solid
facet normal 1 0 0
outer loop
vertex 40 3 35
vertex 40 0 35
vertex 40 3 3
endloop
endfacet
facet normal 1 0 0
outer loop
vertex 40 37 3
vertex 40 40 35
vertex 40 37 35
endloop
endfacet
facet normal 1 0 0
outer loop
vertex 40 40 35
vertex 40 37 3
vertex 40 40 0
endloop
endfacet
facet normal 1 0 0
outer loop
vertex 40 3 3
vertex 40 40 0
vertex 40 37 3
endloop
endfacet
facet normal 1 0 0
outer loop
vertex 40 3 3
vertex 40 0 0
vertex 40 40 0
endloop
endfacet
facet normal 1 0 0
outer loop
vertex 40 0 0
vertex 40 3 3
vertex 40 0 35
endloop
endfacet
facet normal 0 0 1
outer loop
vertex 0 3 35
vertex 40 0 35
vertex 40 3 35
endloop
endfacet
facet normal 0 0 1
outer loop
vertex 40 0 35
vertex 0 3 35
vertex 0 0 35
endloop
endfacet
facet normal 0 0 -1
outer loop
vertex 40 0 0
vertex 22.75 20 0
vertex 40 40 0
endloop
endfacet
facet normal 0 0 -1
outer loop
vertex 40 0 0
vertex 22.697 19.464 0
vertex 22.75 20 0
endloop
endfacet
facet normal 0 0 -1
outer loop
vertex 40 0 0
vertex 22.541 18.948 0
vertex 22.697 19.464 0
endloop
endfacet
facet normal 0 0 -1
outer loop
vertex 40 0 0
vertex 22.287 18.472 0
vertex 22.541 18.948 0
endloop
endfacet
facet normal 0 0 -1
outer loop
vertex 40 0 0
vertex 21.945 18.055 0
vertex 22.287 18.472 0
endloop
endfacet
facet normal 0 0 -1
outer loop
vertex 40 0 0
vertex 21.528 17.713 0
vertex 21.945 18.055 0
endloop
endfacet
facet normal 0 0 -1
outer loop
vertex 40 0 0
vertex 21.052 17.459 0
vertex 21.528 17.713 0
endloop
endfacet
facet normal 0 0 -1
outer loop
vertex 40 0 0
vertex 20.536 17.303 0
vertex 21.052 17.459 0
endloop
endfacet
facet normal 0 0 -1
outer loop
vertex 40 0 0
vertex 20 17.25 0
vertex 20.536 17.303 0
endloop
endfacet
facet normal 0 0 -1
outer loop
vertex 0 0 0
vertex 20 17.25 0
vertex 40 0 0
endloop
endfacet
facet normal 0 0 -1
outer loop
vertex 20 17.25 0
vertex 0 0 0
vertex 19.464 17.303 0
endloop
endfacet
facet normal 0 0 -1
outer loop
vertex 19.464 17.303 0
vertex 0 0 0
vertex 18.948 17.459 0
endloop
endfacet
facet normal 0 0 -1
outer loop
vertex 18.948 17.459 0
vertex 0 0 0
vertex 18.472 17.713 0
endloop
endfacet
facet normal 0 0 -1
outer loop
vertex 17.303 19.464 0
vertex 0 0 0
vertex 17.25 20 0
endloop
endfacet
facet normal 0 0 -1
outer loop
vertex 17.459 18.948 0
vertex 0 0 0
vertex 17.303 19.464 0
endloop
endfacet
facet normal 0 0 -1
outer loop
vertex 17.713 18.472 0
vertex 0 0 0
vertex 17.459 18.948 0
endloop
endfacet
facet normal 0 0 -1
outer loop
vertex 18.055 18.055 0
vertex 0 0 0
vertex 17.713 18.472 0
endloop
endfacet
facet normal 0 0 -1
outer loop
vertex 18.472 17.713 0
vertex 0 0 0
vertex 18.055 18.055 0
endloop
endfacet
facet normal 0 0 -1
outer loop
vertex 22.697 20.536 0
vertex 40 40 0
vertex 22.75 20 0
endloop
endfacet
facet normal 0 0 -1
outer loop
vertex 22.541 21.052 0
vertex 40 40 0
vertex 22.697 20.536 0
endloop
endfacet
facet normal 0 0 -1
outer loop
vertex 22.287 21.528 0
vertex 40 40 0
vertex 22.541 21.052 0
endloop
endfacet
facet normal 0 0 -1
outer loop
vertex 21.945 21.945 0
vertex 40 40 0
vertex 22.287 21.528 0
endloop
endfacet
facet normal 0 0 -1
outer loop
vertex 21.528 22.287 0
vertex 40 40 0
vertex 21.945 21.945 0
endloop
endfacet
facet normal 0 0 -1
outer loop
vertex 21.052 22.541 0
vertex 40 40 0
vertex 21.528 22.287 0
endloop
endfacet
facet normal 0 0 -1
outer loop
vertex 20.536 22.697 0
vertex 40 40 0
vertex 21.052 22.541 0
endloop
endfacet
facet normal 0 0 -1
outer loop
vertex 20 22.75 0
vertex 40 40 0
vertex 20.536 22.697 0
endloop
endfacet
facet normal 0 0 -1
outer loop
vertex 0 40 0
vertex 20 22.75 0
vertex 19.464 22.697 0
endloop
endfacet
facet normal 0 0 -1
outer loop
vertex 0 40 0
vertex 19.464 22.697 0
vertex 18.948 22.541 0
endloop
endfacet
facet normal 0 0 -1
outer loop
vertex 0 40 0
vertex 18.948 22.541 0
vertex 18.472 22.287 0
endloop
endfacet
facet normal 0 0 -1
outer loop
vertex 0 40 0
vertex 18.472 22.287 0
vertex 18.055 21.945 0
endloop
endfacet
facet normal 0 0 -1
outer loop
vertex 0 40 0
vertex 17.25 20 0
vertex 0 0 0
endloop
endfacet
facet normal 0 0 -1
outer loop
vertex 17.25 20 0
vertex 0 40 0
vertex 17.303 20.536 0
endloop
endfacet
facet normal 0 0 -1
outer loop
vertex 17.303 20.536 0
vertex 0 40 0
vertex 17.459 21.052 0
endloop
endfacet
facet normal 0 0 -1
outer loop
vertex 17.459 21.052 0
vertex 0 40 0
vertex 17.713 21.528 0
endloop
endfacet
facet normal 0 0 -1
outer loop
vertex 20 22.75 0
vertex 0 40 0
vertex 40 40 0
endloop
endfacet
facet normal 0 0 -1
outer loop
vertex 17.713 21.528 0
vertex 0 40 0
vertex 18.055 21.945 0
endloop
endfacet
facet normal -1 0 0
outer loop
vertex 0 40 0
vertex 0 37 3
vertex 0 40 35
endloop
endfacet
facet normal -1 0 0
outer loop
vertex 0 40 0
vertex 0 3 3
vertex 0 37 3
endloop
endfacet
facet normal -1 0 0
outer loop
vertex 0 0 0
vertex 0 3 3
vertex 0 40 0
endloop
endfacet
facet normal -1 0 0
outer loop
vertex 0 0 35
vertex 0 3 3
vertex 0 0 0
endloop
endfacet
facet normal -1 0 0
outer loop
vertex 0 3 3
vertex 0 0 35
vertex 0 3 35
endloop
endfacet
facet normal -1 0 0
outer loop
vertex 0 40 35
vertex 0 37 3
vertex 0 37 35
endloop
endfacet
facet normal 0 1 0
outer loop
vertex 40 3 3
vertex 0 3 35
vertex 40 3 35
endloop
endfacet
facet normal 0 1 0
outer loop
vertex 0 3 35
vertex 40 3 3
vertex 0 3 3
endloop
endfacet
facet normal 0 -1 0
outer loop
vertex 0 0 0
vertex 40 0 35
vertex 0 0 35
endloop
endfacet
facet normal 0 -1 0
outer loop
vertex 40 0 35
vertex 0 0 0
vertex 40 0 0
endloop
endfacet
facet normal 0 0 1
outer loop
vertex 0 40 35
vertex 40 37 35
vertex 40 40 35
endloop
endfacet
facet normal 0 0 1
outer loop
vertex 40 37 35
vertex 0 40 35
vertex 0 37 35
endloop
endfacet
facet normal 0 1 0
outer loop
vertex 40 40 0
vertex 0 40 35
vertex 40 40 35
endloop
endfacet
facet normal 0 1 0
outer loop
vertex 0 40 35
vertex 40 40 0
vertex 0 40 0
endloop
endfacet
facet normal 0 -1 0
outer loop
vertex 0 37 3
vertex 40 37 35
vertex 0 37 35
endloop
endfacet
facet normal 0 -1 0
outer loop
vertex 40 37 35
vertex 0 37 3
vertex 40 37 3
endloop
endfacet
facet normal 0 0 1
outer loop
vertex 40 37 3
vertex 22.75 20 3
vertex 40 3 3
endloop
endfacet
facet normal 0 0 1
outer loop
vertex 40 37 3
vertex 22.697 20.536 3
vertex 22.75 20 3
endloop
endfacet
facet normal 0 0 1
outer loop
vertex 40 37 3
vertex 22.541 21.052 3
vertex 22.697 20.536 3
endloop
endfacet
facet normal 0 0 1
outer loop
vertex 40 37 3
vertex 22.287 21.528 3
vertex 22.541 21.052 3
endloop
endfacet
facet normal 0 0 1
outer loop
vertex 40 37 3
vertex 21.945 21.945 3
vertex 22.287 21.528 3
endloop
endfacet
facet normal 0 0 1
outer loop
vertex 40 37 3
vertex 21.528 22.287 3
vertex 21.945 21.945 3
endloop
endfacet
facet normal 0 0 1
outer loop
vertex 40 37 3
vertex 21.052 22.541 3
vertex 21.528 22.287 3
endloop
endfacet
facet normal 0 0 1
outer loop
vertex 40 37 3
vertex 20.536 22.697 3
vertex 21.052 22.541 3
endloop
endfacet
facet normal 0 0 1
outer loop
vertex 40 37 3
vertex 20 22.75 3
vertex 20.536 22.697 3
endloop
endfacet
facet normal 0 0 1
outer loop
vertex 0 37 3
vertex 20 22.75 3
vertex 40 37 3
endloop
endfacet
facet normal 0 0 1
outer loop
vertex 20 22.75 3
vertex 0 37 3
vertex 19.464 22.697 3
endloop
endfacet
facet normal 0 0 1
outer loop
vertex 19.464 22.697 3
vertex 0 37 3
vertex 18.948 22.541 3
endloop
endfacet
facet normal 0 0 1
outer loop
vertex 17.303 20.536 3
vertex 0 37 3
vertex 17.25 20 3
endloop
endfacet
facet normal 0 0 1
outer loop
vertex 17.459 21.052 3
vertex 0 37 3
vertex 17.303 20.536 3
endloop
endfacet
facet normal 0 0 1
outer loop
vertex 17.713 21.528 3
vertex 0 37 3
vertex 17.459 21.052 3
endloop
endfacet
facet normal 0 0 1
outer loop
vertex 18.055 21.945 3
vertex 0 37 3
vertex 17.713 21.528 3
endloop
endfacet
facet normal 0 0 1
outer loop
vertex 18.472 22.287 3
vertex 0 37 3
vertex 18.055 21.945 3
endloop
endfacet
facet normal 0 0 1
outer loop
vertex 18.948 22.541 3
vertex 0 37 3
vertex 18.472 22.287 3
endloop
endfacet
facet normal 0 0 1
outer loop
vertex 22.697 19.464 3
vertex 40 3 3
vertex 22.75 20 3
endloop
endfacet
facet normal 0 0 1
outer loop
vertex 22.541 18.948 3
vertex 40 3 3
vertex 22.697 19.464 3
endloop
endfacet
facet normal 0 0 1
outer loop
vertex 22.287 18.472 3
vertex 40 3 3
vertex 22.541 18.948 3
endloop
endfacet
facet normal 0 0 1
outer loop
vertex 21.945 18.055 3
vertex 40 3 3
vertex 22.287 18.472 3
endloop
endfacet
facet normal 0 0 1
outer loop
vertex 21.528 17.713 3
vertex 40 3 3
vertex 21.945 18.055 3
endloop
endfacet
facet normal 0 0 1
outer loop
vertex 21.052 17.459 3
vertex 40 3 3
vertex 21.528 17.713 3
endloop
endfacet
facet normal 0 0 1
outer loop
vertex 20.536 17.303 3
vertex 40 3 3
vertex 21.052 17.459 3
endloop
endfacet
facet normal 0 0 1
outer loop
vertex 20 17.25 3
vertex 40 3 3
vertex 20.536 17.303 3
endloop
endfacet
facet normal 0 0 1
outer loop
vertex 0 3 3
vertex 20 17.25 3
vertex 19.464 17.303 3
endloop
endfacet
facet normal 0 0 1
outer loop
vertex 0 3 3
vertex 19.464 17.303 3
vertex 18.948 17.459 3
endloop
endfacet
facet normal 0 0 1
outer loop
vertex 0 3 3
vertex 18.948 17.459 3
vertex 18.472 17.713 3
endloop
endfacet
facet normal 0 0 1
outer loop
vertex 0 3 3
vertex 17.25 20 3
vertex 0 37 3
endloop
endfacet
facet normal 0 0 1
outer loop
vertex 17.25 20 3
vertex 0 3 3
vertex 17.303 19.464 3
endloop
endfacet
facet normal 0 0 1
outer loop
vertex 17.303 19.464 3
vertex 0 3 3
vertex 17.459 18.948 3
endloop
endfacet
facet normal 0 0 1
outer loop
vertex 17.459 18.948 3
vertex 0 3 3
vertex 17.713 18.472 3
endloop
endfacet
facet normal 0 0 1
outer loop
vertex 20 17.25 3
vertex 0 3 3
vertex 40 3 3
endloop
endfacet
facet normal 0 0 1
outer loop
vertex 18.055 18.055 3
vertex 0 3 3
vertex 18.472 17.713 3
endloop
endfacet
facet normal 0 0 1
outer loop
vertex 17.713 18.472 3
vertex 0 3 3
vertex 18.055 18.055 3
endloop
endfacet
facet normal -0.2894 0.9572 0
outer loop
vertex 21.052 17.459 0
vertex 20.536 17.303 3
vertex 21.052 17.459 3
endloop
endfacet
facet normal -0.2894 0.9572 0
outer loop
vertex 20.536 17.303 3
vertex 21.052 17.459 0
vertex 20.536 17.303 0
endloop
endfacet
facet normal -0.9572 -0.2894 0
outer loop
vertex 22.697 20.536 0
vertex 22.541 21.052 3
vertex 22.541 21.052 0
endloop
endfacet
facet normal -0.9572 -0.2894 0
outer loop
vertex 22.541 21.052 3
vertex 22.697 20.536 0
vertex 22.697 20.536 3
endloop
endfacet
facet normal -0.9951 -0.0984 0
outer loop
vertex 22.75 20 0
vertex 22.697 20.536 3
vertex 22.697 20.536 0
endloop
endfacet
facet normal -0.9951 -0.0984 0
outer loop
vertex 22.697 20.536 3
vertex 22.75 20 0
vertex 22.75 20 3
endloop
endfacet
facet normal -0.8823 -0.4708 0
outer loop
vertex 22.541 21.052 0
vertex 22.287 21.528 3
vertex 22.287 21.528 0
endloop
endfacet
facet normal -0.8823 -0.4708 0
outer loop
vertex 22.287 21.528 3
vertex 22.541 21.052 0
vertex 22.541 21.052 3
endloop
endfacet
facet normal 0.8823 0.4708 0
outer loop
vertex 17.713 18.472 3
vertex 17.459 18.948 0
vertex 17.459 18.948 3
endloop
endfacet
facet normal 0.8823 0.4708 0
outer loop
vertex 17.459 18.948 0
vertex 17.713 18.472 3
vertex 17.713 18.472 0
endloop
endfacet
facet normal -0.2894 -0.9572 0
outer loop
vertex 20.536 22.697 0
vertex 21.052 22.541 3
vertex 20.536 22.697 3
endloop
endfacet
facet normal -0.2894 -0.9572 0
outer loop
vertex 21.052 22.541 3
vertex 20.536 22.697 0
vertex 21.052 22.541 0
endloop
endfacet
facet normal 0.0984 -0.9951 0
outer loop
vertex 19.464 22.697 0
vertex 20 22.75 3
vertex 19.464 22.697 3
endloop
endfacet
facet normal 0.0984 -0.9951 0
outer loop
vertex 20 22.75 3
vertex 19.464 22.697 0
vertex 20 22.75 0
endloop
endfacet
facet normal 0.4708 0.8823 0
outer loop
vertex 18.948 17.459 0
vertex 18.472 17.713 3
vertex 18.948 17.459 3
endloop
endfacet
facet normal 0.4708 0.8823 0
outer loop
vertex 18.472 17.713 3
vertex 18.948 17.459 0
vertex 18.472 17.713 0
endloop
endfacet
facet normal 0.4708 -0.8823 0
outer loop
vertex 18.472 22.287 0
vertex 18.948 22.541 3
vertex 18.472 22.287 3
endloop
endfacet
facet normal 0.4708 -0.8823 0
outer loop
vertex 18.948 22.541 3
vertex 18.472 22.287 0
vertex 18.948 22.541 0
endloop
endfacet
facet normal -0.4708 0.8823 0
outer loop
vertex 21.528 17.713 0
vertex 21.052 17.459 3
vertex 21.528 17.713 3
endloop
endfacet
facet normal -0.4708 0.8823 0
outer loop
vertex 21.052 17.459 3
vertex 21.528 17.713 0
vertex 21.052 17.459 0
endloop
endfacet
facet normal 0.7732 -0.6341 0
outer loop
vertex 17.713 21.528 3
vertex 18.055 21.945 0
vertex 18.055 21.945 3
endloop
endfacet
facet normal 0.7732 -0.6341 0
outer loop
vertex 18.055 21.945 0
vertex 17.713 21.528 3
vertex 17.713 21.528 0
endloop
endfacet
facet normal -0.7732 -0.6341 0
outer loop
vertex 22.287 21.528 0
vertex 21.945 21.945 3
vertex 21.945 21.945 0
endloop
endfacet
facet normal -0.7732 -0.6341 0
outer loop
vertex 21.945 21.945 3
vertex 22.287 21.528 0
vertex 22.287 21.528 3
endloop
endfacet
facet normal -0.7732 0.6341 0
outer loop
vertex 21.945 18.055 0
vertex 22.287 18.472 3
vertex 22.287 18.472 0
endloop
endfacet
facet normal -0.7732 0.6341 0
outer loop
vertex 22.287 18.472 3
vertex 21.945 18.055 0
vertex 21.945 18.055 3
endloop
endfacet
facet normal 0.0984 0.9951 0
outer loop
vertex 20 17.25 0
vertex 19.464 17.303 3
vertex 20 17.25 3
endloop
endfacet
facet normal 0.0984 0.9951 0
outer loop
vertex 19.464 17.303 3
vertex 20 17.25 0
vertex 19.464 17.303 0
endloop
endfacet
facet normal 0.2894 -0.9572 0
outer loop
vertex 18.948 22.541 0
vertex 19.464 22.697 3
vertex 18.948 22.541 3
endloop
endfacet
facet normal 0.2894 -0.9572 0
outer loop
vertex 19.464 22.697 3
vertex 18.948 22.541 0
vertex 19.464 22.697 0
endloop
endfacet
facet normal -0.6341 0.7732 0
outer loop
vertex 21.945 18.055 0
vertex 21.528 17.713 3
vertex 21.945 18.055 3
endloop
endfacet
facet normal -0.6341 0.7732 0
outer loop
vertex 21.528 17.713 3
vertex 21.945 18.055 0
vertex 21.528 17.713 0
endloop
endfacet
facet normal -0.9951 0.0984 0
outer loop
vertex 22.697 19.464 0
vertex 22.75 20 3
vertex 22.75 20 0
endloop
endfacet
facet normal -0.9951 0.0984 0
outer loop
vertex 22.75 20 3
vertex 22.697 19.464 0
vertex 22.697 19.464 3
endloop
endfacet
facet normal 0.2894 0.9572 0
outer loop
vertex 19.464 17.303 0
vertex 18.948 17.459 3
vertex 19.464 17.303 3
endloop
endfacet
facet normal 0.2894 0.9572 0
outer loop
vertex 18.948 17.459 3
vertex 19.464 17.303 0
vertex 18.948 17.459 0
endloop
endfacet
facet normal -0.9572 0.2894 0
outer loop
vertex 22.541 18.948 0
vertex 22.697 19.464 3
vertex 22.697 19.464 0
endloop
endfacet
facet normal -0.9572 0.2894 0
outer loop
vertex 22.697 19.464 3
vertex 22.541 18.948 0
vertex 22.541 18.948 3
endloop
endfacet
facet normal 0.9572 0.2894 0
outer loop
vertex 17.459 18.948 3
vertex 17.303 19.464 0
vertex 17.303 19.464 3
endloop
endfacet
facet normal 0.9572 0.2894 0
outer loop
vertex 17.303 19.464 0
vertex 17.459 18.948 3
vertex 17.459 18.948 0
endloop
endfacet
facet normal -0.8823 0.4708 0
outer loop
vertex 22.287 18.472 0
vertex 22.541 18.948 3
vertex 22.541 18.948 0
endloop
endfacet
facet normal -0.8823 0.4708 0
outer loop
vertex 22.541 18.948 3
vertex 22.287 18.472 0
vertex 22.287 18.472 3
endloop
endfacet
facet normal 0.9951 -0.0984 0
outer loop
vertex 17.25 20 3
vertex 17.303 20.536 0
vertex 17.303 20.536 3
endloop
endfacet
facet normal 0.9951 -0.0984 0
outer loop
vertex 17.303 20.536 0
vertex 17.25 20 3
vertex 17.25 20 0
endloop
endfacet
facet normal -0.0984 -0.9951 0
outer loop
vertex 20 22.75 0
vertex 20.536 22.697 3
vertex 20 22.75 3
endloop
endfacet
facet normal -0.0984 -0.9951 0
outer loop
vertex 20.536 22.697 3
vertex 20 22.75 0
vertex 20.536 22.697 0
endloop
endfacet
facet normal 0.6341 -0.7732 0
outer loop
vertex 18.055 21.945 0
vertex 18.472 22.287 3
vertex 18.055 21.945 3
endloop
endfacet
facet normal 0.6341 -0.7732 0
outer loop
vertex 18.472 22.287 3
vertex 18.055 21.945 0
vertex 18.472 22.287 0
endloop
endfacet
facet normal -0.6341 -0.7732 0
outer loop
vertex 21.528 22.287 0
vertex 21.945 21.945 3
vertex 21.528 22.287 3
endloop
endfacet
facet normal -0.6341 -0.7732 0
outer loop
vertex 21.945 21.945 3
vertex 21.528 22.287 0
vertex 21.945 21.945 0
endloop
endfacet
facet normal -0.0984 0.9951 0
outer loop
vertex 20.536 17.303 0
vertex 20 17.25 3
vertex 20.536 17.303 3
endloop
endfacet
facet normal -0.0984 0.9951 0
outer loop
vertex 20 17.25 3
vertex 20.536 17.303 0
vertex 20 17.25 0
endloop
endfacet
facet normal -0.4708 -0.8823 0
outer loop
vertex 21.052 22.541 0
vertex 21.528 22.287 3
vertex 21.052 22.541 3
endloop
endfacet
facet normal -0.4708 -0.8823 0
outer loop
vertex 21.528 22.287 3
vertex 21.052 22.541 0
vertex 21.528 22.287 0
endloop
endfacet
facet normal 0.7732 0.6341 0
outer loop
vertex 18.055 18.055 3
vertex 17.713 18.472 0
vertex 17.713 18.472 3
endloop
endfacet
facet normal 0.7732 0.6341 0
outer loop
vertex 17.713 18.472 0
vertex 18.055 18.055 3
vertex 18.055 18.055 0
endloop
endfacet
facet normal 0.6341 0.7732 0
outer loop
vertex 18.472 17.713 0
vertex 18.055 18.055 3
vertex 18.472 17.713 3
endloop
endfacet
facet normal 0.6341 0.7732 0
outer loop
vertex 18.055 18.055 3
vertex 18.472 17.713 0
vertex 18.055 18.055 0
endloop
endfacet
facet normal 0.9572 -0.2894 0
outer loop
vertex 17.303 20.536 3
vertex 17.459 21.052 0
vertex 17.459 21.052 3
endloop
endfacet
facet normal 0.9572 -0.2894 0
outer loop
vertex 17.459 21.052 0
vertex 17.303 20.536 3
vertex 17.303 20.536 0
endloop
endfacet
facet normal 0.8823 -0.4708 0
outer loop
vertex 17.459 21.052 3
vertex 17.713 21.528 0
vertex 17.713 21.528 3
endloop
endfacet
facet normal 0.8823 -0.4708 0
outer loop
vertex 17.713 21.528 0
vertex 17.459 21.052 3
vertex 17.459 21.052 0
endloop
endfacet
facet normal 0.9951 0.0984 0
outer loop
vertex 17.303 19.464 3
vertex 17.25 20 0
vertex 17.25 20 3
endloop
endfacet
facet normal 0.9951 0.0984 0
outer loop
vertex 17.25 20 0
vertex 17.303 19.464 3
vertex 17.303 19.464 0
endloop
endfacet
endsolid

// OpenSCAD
$fn = 32;

// ----------------------------------------------------------------------
// U-bracket: 40 x 40 x 35 mm
// ----------------------------------------------------------------------

// --- parameters (mm) ---
span = 40;                // outer length, X
outer_w = 40;             // outer width, Y
wall_h = 35;              // upright height, Z
plate_t = 3;              // wall thickness
hole_d = 5.5;             // clearance for M5

module hole_z(px, py) {
  translate([px, py, -2.5]) cylinder(h = plate_t + 5, d = hole_d);
}
module hole_y_pz(pz) {
  /* through both uprights along Y */
  translate([0, -2.5, pz]) rotate([-90, 0, 0]) cylinder(h = outer_w + 5, d = hole_d);
}

module base() {
  cube([span, outer_w, plate_t]);
}

module uprights() {
  cube([span, plate_t, wall_h]);
  translate([0, outer_w - plate_t, 0]) cube([span, plate_t, wall_h]);
}

difference() {
  union() {
    base();
    uprights();
  }
  hole_z(20, 20);
}
